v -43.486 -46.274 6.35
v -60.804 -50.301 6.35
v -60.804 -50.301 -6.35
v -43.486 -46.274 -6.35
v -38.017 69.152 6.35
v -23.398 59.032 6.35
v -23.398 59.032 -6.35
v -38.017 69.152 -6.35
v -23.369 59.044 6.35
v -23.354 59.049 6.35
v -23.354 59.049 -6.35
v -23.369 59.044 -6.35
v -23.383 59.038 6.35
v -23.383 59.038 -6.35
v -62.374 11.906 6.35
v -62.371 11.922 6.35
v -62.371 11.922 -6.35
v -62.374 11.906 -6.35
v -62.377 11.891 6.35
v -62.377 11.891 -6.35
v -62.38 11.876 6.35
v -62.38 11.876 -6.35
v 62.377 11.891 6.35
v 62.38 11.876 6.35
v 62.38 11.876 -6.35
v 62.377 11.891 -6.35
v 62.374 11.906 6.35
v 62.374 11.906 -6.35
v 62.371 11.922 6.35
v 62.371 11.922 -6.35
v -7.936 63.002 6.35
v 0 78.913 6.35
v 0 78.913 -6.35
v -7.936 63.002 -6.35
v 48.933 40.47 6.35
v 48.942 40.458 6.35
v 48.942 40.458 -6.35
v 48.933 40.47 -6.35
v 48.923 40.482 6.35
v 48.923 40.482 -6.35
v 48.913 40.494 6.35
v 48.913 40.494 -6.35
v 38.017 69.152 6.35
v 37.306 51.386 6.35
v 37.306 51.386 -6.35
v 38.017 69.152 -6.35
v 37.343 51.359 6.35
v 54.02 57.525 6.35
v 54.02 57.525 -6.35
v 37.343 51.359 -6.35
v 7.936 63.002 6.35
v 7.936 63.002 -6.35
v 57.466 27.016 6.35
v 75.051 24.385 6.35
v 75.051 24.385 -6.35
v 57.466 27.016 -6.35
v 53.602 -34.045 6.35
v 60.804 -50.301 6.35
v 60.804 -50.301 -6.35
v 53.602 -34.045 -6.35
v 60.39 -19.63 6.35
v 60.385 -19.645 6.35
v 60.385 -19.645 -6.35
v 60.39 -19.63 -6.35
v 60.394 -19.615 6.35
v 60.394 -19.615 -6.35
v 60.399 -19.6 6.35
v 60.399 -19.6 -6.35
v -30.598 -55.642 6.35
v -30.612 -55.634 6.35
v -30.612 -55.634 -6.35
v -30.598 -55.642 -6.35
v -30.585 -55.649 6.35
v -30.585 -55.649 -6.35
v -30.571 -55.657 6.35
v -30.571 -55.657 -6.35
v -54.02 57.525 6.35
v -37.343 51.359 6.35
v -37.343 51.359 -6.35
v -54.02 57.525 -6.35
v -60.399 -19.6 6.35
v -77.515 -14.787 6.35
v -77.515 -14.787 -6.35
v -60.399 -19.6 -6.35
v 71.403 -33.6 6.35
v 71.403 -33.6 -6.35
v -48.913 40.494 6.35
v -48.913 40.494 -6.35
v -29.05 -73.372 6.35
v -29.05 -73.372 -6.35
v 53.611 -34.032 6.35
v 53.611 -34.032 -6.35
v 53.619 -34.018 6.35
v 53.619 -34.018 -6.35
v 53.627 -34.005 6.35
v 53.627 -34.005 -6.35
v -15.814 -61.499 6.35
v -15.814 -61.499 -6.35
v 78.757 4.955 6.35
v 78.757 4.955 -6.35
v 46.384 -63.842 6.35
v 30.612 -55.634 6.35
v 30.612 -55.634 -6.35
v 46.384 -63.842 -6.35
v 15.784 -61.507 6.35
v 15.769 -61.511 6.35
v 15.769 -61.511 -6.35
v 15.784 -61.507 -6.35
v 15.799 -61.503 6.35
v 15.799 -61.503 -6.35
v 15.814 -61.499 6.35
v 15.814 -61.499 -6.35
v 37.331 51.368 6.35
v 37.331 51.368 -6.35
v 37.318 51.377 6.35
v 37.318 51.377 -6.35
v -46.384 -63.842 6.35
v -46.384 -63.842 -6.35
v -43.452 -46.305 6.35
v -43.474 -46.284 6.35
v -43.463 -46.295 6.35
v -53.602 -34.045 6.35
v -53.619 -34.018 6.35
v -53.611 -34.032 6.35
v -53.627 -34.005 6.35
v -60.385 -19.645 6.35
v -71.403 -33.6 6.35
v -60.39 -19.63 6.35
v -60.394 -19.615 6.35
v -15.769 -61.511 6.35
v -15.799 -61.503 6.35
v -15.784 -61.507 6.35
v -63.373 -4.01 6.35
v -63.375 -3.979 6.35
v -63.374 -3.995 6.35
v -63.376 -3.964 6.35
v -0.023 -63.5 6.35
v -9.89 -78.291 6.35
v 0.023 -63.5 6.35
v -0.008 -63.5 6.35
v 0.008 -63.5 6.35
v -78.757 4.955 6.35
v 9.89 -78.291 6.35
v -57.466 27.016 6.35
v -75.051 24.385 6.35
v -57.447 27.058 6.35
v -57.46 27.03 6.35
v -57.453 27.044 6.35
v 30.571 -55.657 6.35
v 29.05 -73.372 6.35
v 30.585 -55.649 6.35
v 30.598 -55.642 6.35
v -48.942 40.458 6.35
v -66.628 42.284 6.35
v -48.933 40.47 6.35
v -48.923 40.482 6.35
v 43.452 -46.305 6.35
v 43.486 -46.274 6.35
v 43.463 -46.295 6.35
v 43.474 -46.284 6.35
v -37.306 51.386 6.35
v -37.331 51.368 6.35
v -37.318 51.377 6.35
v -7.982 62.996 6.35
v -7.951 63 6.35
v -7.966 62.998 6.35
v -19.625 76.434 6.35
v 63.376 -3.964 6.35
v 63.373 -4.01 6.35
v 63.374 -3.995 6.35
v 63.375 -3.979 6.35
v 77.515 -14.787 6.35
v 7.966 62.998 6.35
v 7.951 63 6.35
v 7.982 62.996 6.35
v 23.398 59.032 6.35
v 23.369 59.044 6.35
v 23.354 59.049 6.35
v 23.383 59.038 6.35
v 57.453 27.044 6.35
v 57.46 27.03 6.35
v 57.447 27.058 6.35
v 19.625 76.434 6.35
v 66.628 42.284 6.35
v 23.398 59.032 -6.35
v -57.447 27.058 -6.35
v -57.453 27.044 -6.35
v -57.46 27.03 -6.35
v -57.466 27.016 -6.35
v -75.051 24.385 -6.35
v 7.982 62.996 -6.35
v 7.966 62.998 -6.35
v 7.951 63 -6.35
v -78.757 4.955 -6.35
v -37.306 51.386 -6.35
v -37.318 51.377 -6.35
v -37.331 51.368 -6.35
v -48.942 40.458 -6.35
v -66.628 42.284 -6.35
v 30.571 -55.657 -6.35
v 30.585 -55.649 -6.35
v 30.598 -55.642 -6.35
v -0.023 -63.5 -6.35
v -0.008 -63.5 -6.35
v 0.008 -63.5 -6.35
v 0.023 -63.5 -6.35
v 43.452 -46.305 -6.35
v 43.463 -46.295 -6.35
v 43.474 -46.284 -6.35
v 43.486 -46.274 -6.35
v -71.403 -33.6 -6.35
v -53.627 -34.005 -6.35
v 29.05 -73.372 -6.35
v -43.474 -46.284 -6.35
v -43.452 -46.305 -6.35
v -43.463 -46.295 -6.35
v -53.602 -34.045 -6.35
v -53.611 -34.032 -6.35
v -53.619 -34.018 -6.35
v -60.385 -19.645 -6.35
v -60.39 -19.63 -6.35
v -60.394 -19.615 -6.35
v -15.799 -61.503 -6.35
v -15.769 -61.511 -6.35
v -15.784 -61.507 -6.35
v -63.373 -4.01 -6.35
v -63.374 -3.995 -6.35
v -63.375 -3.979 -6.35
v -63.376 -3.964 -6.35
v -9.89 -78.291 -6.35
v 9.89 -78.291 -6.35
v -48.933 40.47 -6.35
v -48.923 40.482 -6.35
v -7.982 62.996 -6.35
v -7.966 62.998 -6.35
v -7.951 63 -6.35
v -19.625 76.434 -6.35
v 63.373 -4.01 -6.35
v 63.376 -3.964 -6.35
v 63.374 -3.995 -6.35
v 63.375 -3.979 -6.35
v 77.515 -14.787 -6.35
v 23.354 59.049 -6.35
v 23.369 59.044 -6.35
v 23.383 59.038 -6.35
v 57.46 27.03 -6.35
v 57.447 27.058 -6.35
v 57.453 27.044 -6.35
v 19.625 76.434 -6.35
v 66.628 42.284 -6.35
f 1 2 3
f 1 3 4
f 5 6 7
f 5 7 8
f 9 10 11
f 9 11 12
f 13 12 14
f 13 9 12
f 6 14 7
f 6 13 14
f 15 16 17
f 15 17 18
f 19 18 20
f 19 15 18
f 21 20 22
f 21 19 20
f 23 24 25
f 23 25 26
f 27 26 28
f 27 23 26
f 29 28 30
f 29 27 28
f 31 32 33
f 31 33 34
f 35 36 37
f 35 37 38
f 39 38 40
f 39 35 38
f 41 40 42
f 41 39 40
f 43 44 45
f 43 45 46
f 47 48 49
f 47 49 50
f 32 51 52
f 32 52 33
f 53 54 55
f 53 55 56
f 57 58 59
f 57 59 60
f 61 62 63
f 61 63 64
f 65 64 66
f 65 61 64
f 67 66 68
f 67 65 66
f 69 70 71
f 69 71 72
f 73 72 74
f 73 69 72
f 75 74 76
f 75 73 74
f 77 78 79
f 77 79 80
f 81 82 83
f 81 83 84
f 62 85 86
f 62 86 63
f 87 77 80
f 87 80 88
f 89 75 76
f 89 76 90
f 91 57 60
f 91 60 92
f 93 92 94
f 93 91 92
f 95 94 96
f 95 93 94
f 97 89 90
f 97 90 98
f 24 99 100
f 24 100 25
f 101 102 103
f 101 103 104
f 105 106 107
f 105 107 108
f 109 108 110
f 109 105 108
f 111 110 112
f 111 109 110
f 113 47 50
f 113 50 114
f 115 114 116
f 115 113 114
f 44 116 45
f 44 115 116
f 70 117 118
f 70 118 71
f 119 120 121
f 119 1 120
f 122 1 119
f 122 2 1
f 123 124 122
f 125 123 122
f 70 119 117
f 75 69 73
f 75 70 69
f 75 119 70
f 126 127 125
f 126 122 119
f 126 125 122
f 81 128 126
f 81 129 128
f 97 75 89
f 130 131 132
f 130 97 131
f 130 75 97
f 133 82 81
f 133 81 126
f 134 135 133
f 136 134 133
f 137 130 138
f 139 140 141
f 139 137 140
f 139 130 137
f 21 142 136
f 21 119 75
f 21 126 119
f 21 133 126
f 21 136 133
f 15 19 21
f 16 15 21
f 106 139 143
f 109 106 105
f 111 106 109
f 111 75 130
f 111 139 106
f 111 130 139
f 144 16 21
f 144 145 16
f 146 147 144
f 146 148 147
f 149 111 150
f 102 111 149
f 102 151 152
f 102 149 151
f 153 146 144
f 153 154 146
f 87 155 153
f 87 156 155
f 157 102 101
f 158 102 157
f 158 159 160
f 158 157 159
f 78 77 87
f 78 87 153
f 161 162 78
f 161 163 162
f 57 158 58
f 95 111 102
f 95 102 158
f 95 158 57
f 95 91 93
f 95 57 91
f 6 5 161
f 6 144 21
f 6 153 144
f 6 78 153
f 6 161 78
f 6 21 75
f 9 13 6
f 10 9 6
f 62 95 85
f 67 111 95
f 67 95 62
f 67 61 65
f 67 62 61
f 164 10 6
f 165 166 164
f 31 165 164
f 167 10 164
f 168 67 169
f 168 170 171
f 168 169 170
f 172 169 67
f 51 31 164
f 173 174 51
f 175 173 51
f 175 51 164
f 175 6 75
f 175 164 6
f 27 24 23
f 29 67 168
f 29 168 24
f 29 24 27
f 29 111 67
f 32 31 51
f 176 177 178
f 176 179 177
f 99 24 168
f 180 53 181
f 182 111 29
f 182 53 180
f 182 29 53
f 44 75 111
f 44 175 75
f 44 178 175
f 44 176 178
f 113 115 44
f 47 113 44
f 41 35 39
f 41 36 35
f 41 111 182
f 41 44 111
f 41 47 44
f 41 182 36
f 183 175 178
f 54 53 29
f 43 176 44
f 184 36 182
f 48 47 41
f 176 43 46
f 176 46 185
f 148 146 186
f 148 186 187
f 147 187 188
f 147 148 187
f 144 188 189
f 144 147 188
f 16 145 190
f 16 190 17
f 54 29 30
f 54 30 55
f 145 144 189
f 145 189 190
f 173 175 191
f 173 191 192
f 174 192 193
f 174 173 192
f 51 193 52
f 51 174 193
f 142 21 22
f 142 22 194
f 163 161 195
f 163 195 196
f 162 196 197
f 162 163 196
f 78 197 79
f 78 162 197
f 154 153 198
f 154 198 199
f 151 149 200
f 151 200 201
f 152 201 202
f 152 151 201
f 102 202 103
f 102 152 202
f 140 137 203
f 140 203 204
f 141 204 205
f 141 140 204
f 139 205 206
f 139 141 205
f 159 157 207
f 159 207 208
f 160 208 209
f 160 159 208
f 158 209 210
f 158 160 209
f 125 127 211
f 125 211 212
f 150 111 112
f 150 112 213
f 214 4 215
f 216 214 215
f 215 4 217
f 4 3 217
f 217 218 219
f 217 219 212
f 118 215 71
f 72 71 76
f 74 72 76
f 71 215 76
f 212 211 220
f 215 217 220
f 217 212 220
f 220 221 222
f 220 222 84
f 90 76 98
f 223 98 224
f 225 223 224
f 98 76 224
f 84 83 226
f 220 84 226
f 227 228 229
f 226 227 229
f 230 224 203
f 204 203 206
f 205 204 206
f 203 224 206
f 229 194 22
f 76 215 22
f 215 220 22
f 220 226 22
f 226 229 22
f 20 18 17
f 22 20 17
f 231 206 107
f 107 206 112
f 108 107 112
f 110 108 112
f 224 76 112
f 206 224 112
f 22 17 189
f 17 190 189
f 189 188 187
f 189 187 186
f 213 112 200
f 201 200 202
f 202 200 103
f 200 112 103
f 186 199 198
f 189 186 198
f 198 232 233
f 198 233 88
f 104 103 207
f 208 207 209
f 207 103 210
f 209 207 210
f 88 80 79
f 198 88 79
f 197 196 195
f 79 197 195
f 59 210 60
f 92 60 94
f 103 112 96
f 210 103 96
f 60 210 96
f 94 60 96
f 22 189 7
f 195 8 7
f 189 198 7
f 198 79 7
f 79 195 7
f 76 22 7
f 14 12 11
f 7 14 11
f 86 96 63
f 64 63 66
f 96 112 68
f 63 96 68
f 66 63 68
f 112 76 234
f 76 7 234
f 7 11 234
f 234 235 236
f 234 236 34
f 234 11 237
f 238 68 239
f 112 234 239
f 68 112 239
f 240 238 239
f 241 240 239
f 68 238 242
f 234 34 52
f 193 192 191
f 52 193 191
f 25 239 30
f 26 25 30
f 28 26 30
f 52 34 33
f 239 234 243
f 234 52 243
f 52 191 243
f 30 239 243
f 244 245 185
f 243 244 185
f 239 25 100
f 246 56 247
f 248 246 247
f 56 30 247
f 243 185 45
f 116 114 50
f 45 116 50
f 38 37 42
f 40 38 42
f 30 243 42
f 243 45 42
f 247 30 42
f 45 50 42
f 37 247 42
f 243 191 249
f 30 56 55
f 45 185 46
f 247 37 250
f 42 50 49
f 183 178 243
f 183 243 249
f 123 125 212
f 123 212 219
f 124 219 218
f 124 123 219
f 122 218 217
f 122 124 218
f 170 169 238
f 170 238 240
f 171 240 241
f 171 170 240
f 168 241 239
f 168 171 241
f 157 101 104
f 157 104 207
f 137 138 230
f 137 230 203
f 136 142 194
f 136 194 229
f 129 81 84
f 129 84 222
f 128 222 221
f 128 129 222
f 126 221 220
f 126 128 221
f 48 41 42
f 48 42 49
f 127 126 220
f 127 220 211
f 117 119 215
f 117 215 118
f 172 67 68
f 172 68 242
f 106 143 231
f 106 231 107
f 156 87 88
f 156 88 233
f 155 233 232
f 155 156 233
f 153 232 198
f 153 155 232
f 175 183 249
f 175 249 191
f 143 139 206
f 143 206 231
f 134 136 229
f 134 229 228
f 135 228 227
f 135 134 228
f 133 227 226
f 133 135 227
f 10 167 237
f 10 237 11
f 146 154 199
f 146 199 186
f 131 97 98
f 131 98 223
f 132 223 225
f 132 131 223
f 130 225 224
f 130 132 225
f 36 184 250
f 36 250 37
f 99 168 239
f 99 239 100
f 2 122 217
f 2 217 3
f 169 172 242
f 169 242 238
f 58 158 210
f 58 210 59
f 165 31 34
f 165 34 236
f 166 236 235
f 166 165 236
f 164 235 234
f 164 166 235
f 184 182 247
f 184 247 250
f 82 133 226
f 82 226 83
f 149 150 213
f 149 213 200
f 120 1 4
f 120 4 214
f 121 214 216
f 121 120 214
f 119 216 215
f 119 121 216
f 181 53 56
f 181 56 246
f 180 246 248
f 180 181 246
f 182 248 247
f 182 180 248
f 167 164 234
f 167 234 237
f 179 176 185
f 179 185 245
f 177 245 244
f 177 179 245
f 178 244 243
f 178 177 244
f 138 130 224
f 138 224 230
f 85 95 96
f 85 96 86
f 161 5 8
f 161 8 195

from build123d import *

# Parameters (mm, degrees)
F0_R            = 63.5
F1_DEPTH        = 6.35
F3_DEPTH        = 12.7
F3_COPIES_COUNT = 25


# Not quite as in the source:
# - a pattern or mirror of a feature is missing from the dataset's text; its kind, count and spacing are read off the source's solid


with BuildPart() as f1:
    # F0 (on Top) → F1 (new body, symmetric)
    with BuildSketch(Plane.XY):
        Circle(F0_R)
    extrude(amount=F1_DEPTH, both=True)

    # F2 (on face) → F3 (join, through all)
    with BuildSketch(Plane.XY.offset(6.35)):
        with BuildLine():
            Line((0, 78.9130567023), (-7.9355522703, 63.002198455))
            ThreePointArc((-7.9355522703, 63.002198455), (0, 63.5), (7.9355522703, 63.002198455))
            Line((7.9355522703, 63.002198455), (0, 78.9130567023))
        make_face()
    f3 = extrude(amount=-F3_DEPTH)

    # F3_copies: F3 ×25 about axis
    f3_copies_axis = Axis((0, 0, 0), (0, 0, 1))
    for i in range(1, F3_COPIES_COUNT):
        add(f3.rotate(f3_copies_axis, i * 360 / F3_COPIES_COUNT))


solid = f1.part
